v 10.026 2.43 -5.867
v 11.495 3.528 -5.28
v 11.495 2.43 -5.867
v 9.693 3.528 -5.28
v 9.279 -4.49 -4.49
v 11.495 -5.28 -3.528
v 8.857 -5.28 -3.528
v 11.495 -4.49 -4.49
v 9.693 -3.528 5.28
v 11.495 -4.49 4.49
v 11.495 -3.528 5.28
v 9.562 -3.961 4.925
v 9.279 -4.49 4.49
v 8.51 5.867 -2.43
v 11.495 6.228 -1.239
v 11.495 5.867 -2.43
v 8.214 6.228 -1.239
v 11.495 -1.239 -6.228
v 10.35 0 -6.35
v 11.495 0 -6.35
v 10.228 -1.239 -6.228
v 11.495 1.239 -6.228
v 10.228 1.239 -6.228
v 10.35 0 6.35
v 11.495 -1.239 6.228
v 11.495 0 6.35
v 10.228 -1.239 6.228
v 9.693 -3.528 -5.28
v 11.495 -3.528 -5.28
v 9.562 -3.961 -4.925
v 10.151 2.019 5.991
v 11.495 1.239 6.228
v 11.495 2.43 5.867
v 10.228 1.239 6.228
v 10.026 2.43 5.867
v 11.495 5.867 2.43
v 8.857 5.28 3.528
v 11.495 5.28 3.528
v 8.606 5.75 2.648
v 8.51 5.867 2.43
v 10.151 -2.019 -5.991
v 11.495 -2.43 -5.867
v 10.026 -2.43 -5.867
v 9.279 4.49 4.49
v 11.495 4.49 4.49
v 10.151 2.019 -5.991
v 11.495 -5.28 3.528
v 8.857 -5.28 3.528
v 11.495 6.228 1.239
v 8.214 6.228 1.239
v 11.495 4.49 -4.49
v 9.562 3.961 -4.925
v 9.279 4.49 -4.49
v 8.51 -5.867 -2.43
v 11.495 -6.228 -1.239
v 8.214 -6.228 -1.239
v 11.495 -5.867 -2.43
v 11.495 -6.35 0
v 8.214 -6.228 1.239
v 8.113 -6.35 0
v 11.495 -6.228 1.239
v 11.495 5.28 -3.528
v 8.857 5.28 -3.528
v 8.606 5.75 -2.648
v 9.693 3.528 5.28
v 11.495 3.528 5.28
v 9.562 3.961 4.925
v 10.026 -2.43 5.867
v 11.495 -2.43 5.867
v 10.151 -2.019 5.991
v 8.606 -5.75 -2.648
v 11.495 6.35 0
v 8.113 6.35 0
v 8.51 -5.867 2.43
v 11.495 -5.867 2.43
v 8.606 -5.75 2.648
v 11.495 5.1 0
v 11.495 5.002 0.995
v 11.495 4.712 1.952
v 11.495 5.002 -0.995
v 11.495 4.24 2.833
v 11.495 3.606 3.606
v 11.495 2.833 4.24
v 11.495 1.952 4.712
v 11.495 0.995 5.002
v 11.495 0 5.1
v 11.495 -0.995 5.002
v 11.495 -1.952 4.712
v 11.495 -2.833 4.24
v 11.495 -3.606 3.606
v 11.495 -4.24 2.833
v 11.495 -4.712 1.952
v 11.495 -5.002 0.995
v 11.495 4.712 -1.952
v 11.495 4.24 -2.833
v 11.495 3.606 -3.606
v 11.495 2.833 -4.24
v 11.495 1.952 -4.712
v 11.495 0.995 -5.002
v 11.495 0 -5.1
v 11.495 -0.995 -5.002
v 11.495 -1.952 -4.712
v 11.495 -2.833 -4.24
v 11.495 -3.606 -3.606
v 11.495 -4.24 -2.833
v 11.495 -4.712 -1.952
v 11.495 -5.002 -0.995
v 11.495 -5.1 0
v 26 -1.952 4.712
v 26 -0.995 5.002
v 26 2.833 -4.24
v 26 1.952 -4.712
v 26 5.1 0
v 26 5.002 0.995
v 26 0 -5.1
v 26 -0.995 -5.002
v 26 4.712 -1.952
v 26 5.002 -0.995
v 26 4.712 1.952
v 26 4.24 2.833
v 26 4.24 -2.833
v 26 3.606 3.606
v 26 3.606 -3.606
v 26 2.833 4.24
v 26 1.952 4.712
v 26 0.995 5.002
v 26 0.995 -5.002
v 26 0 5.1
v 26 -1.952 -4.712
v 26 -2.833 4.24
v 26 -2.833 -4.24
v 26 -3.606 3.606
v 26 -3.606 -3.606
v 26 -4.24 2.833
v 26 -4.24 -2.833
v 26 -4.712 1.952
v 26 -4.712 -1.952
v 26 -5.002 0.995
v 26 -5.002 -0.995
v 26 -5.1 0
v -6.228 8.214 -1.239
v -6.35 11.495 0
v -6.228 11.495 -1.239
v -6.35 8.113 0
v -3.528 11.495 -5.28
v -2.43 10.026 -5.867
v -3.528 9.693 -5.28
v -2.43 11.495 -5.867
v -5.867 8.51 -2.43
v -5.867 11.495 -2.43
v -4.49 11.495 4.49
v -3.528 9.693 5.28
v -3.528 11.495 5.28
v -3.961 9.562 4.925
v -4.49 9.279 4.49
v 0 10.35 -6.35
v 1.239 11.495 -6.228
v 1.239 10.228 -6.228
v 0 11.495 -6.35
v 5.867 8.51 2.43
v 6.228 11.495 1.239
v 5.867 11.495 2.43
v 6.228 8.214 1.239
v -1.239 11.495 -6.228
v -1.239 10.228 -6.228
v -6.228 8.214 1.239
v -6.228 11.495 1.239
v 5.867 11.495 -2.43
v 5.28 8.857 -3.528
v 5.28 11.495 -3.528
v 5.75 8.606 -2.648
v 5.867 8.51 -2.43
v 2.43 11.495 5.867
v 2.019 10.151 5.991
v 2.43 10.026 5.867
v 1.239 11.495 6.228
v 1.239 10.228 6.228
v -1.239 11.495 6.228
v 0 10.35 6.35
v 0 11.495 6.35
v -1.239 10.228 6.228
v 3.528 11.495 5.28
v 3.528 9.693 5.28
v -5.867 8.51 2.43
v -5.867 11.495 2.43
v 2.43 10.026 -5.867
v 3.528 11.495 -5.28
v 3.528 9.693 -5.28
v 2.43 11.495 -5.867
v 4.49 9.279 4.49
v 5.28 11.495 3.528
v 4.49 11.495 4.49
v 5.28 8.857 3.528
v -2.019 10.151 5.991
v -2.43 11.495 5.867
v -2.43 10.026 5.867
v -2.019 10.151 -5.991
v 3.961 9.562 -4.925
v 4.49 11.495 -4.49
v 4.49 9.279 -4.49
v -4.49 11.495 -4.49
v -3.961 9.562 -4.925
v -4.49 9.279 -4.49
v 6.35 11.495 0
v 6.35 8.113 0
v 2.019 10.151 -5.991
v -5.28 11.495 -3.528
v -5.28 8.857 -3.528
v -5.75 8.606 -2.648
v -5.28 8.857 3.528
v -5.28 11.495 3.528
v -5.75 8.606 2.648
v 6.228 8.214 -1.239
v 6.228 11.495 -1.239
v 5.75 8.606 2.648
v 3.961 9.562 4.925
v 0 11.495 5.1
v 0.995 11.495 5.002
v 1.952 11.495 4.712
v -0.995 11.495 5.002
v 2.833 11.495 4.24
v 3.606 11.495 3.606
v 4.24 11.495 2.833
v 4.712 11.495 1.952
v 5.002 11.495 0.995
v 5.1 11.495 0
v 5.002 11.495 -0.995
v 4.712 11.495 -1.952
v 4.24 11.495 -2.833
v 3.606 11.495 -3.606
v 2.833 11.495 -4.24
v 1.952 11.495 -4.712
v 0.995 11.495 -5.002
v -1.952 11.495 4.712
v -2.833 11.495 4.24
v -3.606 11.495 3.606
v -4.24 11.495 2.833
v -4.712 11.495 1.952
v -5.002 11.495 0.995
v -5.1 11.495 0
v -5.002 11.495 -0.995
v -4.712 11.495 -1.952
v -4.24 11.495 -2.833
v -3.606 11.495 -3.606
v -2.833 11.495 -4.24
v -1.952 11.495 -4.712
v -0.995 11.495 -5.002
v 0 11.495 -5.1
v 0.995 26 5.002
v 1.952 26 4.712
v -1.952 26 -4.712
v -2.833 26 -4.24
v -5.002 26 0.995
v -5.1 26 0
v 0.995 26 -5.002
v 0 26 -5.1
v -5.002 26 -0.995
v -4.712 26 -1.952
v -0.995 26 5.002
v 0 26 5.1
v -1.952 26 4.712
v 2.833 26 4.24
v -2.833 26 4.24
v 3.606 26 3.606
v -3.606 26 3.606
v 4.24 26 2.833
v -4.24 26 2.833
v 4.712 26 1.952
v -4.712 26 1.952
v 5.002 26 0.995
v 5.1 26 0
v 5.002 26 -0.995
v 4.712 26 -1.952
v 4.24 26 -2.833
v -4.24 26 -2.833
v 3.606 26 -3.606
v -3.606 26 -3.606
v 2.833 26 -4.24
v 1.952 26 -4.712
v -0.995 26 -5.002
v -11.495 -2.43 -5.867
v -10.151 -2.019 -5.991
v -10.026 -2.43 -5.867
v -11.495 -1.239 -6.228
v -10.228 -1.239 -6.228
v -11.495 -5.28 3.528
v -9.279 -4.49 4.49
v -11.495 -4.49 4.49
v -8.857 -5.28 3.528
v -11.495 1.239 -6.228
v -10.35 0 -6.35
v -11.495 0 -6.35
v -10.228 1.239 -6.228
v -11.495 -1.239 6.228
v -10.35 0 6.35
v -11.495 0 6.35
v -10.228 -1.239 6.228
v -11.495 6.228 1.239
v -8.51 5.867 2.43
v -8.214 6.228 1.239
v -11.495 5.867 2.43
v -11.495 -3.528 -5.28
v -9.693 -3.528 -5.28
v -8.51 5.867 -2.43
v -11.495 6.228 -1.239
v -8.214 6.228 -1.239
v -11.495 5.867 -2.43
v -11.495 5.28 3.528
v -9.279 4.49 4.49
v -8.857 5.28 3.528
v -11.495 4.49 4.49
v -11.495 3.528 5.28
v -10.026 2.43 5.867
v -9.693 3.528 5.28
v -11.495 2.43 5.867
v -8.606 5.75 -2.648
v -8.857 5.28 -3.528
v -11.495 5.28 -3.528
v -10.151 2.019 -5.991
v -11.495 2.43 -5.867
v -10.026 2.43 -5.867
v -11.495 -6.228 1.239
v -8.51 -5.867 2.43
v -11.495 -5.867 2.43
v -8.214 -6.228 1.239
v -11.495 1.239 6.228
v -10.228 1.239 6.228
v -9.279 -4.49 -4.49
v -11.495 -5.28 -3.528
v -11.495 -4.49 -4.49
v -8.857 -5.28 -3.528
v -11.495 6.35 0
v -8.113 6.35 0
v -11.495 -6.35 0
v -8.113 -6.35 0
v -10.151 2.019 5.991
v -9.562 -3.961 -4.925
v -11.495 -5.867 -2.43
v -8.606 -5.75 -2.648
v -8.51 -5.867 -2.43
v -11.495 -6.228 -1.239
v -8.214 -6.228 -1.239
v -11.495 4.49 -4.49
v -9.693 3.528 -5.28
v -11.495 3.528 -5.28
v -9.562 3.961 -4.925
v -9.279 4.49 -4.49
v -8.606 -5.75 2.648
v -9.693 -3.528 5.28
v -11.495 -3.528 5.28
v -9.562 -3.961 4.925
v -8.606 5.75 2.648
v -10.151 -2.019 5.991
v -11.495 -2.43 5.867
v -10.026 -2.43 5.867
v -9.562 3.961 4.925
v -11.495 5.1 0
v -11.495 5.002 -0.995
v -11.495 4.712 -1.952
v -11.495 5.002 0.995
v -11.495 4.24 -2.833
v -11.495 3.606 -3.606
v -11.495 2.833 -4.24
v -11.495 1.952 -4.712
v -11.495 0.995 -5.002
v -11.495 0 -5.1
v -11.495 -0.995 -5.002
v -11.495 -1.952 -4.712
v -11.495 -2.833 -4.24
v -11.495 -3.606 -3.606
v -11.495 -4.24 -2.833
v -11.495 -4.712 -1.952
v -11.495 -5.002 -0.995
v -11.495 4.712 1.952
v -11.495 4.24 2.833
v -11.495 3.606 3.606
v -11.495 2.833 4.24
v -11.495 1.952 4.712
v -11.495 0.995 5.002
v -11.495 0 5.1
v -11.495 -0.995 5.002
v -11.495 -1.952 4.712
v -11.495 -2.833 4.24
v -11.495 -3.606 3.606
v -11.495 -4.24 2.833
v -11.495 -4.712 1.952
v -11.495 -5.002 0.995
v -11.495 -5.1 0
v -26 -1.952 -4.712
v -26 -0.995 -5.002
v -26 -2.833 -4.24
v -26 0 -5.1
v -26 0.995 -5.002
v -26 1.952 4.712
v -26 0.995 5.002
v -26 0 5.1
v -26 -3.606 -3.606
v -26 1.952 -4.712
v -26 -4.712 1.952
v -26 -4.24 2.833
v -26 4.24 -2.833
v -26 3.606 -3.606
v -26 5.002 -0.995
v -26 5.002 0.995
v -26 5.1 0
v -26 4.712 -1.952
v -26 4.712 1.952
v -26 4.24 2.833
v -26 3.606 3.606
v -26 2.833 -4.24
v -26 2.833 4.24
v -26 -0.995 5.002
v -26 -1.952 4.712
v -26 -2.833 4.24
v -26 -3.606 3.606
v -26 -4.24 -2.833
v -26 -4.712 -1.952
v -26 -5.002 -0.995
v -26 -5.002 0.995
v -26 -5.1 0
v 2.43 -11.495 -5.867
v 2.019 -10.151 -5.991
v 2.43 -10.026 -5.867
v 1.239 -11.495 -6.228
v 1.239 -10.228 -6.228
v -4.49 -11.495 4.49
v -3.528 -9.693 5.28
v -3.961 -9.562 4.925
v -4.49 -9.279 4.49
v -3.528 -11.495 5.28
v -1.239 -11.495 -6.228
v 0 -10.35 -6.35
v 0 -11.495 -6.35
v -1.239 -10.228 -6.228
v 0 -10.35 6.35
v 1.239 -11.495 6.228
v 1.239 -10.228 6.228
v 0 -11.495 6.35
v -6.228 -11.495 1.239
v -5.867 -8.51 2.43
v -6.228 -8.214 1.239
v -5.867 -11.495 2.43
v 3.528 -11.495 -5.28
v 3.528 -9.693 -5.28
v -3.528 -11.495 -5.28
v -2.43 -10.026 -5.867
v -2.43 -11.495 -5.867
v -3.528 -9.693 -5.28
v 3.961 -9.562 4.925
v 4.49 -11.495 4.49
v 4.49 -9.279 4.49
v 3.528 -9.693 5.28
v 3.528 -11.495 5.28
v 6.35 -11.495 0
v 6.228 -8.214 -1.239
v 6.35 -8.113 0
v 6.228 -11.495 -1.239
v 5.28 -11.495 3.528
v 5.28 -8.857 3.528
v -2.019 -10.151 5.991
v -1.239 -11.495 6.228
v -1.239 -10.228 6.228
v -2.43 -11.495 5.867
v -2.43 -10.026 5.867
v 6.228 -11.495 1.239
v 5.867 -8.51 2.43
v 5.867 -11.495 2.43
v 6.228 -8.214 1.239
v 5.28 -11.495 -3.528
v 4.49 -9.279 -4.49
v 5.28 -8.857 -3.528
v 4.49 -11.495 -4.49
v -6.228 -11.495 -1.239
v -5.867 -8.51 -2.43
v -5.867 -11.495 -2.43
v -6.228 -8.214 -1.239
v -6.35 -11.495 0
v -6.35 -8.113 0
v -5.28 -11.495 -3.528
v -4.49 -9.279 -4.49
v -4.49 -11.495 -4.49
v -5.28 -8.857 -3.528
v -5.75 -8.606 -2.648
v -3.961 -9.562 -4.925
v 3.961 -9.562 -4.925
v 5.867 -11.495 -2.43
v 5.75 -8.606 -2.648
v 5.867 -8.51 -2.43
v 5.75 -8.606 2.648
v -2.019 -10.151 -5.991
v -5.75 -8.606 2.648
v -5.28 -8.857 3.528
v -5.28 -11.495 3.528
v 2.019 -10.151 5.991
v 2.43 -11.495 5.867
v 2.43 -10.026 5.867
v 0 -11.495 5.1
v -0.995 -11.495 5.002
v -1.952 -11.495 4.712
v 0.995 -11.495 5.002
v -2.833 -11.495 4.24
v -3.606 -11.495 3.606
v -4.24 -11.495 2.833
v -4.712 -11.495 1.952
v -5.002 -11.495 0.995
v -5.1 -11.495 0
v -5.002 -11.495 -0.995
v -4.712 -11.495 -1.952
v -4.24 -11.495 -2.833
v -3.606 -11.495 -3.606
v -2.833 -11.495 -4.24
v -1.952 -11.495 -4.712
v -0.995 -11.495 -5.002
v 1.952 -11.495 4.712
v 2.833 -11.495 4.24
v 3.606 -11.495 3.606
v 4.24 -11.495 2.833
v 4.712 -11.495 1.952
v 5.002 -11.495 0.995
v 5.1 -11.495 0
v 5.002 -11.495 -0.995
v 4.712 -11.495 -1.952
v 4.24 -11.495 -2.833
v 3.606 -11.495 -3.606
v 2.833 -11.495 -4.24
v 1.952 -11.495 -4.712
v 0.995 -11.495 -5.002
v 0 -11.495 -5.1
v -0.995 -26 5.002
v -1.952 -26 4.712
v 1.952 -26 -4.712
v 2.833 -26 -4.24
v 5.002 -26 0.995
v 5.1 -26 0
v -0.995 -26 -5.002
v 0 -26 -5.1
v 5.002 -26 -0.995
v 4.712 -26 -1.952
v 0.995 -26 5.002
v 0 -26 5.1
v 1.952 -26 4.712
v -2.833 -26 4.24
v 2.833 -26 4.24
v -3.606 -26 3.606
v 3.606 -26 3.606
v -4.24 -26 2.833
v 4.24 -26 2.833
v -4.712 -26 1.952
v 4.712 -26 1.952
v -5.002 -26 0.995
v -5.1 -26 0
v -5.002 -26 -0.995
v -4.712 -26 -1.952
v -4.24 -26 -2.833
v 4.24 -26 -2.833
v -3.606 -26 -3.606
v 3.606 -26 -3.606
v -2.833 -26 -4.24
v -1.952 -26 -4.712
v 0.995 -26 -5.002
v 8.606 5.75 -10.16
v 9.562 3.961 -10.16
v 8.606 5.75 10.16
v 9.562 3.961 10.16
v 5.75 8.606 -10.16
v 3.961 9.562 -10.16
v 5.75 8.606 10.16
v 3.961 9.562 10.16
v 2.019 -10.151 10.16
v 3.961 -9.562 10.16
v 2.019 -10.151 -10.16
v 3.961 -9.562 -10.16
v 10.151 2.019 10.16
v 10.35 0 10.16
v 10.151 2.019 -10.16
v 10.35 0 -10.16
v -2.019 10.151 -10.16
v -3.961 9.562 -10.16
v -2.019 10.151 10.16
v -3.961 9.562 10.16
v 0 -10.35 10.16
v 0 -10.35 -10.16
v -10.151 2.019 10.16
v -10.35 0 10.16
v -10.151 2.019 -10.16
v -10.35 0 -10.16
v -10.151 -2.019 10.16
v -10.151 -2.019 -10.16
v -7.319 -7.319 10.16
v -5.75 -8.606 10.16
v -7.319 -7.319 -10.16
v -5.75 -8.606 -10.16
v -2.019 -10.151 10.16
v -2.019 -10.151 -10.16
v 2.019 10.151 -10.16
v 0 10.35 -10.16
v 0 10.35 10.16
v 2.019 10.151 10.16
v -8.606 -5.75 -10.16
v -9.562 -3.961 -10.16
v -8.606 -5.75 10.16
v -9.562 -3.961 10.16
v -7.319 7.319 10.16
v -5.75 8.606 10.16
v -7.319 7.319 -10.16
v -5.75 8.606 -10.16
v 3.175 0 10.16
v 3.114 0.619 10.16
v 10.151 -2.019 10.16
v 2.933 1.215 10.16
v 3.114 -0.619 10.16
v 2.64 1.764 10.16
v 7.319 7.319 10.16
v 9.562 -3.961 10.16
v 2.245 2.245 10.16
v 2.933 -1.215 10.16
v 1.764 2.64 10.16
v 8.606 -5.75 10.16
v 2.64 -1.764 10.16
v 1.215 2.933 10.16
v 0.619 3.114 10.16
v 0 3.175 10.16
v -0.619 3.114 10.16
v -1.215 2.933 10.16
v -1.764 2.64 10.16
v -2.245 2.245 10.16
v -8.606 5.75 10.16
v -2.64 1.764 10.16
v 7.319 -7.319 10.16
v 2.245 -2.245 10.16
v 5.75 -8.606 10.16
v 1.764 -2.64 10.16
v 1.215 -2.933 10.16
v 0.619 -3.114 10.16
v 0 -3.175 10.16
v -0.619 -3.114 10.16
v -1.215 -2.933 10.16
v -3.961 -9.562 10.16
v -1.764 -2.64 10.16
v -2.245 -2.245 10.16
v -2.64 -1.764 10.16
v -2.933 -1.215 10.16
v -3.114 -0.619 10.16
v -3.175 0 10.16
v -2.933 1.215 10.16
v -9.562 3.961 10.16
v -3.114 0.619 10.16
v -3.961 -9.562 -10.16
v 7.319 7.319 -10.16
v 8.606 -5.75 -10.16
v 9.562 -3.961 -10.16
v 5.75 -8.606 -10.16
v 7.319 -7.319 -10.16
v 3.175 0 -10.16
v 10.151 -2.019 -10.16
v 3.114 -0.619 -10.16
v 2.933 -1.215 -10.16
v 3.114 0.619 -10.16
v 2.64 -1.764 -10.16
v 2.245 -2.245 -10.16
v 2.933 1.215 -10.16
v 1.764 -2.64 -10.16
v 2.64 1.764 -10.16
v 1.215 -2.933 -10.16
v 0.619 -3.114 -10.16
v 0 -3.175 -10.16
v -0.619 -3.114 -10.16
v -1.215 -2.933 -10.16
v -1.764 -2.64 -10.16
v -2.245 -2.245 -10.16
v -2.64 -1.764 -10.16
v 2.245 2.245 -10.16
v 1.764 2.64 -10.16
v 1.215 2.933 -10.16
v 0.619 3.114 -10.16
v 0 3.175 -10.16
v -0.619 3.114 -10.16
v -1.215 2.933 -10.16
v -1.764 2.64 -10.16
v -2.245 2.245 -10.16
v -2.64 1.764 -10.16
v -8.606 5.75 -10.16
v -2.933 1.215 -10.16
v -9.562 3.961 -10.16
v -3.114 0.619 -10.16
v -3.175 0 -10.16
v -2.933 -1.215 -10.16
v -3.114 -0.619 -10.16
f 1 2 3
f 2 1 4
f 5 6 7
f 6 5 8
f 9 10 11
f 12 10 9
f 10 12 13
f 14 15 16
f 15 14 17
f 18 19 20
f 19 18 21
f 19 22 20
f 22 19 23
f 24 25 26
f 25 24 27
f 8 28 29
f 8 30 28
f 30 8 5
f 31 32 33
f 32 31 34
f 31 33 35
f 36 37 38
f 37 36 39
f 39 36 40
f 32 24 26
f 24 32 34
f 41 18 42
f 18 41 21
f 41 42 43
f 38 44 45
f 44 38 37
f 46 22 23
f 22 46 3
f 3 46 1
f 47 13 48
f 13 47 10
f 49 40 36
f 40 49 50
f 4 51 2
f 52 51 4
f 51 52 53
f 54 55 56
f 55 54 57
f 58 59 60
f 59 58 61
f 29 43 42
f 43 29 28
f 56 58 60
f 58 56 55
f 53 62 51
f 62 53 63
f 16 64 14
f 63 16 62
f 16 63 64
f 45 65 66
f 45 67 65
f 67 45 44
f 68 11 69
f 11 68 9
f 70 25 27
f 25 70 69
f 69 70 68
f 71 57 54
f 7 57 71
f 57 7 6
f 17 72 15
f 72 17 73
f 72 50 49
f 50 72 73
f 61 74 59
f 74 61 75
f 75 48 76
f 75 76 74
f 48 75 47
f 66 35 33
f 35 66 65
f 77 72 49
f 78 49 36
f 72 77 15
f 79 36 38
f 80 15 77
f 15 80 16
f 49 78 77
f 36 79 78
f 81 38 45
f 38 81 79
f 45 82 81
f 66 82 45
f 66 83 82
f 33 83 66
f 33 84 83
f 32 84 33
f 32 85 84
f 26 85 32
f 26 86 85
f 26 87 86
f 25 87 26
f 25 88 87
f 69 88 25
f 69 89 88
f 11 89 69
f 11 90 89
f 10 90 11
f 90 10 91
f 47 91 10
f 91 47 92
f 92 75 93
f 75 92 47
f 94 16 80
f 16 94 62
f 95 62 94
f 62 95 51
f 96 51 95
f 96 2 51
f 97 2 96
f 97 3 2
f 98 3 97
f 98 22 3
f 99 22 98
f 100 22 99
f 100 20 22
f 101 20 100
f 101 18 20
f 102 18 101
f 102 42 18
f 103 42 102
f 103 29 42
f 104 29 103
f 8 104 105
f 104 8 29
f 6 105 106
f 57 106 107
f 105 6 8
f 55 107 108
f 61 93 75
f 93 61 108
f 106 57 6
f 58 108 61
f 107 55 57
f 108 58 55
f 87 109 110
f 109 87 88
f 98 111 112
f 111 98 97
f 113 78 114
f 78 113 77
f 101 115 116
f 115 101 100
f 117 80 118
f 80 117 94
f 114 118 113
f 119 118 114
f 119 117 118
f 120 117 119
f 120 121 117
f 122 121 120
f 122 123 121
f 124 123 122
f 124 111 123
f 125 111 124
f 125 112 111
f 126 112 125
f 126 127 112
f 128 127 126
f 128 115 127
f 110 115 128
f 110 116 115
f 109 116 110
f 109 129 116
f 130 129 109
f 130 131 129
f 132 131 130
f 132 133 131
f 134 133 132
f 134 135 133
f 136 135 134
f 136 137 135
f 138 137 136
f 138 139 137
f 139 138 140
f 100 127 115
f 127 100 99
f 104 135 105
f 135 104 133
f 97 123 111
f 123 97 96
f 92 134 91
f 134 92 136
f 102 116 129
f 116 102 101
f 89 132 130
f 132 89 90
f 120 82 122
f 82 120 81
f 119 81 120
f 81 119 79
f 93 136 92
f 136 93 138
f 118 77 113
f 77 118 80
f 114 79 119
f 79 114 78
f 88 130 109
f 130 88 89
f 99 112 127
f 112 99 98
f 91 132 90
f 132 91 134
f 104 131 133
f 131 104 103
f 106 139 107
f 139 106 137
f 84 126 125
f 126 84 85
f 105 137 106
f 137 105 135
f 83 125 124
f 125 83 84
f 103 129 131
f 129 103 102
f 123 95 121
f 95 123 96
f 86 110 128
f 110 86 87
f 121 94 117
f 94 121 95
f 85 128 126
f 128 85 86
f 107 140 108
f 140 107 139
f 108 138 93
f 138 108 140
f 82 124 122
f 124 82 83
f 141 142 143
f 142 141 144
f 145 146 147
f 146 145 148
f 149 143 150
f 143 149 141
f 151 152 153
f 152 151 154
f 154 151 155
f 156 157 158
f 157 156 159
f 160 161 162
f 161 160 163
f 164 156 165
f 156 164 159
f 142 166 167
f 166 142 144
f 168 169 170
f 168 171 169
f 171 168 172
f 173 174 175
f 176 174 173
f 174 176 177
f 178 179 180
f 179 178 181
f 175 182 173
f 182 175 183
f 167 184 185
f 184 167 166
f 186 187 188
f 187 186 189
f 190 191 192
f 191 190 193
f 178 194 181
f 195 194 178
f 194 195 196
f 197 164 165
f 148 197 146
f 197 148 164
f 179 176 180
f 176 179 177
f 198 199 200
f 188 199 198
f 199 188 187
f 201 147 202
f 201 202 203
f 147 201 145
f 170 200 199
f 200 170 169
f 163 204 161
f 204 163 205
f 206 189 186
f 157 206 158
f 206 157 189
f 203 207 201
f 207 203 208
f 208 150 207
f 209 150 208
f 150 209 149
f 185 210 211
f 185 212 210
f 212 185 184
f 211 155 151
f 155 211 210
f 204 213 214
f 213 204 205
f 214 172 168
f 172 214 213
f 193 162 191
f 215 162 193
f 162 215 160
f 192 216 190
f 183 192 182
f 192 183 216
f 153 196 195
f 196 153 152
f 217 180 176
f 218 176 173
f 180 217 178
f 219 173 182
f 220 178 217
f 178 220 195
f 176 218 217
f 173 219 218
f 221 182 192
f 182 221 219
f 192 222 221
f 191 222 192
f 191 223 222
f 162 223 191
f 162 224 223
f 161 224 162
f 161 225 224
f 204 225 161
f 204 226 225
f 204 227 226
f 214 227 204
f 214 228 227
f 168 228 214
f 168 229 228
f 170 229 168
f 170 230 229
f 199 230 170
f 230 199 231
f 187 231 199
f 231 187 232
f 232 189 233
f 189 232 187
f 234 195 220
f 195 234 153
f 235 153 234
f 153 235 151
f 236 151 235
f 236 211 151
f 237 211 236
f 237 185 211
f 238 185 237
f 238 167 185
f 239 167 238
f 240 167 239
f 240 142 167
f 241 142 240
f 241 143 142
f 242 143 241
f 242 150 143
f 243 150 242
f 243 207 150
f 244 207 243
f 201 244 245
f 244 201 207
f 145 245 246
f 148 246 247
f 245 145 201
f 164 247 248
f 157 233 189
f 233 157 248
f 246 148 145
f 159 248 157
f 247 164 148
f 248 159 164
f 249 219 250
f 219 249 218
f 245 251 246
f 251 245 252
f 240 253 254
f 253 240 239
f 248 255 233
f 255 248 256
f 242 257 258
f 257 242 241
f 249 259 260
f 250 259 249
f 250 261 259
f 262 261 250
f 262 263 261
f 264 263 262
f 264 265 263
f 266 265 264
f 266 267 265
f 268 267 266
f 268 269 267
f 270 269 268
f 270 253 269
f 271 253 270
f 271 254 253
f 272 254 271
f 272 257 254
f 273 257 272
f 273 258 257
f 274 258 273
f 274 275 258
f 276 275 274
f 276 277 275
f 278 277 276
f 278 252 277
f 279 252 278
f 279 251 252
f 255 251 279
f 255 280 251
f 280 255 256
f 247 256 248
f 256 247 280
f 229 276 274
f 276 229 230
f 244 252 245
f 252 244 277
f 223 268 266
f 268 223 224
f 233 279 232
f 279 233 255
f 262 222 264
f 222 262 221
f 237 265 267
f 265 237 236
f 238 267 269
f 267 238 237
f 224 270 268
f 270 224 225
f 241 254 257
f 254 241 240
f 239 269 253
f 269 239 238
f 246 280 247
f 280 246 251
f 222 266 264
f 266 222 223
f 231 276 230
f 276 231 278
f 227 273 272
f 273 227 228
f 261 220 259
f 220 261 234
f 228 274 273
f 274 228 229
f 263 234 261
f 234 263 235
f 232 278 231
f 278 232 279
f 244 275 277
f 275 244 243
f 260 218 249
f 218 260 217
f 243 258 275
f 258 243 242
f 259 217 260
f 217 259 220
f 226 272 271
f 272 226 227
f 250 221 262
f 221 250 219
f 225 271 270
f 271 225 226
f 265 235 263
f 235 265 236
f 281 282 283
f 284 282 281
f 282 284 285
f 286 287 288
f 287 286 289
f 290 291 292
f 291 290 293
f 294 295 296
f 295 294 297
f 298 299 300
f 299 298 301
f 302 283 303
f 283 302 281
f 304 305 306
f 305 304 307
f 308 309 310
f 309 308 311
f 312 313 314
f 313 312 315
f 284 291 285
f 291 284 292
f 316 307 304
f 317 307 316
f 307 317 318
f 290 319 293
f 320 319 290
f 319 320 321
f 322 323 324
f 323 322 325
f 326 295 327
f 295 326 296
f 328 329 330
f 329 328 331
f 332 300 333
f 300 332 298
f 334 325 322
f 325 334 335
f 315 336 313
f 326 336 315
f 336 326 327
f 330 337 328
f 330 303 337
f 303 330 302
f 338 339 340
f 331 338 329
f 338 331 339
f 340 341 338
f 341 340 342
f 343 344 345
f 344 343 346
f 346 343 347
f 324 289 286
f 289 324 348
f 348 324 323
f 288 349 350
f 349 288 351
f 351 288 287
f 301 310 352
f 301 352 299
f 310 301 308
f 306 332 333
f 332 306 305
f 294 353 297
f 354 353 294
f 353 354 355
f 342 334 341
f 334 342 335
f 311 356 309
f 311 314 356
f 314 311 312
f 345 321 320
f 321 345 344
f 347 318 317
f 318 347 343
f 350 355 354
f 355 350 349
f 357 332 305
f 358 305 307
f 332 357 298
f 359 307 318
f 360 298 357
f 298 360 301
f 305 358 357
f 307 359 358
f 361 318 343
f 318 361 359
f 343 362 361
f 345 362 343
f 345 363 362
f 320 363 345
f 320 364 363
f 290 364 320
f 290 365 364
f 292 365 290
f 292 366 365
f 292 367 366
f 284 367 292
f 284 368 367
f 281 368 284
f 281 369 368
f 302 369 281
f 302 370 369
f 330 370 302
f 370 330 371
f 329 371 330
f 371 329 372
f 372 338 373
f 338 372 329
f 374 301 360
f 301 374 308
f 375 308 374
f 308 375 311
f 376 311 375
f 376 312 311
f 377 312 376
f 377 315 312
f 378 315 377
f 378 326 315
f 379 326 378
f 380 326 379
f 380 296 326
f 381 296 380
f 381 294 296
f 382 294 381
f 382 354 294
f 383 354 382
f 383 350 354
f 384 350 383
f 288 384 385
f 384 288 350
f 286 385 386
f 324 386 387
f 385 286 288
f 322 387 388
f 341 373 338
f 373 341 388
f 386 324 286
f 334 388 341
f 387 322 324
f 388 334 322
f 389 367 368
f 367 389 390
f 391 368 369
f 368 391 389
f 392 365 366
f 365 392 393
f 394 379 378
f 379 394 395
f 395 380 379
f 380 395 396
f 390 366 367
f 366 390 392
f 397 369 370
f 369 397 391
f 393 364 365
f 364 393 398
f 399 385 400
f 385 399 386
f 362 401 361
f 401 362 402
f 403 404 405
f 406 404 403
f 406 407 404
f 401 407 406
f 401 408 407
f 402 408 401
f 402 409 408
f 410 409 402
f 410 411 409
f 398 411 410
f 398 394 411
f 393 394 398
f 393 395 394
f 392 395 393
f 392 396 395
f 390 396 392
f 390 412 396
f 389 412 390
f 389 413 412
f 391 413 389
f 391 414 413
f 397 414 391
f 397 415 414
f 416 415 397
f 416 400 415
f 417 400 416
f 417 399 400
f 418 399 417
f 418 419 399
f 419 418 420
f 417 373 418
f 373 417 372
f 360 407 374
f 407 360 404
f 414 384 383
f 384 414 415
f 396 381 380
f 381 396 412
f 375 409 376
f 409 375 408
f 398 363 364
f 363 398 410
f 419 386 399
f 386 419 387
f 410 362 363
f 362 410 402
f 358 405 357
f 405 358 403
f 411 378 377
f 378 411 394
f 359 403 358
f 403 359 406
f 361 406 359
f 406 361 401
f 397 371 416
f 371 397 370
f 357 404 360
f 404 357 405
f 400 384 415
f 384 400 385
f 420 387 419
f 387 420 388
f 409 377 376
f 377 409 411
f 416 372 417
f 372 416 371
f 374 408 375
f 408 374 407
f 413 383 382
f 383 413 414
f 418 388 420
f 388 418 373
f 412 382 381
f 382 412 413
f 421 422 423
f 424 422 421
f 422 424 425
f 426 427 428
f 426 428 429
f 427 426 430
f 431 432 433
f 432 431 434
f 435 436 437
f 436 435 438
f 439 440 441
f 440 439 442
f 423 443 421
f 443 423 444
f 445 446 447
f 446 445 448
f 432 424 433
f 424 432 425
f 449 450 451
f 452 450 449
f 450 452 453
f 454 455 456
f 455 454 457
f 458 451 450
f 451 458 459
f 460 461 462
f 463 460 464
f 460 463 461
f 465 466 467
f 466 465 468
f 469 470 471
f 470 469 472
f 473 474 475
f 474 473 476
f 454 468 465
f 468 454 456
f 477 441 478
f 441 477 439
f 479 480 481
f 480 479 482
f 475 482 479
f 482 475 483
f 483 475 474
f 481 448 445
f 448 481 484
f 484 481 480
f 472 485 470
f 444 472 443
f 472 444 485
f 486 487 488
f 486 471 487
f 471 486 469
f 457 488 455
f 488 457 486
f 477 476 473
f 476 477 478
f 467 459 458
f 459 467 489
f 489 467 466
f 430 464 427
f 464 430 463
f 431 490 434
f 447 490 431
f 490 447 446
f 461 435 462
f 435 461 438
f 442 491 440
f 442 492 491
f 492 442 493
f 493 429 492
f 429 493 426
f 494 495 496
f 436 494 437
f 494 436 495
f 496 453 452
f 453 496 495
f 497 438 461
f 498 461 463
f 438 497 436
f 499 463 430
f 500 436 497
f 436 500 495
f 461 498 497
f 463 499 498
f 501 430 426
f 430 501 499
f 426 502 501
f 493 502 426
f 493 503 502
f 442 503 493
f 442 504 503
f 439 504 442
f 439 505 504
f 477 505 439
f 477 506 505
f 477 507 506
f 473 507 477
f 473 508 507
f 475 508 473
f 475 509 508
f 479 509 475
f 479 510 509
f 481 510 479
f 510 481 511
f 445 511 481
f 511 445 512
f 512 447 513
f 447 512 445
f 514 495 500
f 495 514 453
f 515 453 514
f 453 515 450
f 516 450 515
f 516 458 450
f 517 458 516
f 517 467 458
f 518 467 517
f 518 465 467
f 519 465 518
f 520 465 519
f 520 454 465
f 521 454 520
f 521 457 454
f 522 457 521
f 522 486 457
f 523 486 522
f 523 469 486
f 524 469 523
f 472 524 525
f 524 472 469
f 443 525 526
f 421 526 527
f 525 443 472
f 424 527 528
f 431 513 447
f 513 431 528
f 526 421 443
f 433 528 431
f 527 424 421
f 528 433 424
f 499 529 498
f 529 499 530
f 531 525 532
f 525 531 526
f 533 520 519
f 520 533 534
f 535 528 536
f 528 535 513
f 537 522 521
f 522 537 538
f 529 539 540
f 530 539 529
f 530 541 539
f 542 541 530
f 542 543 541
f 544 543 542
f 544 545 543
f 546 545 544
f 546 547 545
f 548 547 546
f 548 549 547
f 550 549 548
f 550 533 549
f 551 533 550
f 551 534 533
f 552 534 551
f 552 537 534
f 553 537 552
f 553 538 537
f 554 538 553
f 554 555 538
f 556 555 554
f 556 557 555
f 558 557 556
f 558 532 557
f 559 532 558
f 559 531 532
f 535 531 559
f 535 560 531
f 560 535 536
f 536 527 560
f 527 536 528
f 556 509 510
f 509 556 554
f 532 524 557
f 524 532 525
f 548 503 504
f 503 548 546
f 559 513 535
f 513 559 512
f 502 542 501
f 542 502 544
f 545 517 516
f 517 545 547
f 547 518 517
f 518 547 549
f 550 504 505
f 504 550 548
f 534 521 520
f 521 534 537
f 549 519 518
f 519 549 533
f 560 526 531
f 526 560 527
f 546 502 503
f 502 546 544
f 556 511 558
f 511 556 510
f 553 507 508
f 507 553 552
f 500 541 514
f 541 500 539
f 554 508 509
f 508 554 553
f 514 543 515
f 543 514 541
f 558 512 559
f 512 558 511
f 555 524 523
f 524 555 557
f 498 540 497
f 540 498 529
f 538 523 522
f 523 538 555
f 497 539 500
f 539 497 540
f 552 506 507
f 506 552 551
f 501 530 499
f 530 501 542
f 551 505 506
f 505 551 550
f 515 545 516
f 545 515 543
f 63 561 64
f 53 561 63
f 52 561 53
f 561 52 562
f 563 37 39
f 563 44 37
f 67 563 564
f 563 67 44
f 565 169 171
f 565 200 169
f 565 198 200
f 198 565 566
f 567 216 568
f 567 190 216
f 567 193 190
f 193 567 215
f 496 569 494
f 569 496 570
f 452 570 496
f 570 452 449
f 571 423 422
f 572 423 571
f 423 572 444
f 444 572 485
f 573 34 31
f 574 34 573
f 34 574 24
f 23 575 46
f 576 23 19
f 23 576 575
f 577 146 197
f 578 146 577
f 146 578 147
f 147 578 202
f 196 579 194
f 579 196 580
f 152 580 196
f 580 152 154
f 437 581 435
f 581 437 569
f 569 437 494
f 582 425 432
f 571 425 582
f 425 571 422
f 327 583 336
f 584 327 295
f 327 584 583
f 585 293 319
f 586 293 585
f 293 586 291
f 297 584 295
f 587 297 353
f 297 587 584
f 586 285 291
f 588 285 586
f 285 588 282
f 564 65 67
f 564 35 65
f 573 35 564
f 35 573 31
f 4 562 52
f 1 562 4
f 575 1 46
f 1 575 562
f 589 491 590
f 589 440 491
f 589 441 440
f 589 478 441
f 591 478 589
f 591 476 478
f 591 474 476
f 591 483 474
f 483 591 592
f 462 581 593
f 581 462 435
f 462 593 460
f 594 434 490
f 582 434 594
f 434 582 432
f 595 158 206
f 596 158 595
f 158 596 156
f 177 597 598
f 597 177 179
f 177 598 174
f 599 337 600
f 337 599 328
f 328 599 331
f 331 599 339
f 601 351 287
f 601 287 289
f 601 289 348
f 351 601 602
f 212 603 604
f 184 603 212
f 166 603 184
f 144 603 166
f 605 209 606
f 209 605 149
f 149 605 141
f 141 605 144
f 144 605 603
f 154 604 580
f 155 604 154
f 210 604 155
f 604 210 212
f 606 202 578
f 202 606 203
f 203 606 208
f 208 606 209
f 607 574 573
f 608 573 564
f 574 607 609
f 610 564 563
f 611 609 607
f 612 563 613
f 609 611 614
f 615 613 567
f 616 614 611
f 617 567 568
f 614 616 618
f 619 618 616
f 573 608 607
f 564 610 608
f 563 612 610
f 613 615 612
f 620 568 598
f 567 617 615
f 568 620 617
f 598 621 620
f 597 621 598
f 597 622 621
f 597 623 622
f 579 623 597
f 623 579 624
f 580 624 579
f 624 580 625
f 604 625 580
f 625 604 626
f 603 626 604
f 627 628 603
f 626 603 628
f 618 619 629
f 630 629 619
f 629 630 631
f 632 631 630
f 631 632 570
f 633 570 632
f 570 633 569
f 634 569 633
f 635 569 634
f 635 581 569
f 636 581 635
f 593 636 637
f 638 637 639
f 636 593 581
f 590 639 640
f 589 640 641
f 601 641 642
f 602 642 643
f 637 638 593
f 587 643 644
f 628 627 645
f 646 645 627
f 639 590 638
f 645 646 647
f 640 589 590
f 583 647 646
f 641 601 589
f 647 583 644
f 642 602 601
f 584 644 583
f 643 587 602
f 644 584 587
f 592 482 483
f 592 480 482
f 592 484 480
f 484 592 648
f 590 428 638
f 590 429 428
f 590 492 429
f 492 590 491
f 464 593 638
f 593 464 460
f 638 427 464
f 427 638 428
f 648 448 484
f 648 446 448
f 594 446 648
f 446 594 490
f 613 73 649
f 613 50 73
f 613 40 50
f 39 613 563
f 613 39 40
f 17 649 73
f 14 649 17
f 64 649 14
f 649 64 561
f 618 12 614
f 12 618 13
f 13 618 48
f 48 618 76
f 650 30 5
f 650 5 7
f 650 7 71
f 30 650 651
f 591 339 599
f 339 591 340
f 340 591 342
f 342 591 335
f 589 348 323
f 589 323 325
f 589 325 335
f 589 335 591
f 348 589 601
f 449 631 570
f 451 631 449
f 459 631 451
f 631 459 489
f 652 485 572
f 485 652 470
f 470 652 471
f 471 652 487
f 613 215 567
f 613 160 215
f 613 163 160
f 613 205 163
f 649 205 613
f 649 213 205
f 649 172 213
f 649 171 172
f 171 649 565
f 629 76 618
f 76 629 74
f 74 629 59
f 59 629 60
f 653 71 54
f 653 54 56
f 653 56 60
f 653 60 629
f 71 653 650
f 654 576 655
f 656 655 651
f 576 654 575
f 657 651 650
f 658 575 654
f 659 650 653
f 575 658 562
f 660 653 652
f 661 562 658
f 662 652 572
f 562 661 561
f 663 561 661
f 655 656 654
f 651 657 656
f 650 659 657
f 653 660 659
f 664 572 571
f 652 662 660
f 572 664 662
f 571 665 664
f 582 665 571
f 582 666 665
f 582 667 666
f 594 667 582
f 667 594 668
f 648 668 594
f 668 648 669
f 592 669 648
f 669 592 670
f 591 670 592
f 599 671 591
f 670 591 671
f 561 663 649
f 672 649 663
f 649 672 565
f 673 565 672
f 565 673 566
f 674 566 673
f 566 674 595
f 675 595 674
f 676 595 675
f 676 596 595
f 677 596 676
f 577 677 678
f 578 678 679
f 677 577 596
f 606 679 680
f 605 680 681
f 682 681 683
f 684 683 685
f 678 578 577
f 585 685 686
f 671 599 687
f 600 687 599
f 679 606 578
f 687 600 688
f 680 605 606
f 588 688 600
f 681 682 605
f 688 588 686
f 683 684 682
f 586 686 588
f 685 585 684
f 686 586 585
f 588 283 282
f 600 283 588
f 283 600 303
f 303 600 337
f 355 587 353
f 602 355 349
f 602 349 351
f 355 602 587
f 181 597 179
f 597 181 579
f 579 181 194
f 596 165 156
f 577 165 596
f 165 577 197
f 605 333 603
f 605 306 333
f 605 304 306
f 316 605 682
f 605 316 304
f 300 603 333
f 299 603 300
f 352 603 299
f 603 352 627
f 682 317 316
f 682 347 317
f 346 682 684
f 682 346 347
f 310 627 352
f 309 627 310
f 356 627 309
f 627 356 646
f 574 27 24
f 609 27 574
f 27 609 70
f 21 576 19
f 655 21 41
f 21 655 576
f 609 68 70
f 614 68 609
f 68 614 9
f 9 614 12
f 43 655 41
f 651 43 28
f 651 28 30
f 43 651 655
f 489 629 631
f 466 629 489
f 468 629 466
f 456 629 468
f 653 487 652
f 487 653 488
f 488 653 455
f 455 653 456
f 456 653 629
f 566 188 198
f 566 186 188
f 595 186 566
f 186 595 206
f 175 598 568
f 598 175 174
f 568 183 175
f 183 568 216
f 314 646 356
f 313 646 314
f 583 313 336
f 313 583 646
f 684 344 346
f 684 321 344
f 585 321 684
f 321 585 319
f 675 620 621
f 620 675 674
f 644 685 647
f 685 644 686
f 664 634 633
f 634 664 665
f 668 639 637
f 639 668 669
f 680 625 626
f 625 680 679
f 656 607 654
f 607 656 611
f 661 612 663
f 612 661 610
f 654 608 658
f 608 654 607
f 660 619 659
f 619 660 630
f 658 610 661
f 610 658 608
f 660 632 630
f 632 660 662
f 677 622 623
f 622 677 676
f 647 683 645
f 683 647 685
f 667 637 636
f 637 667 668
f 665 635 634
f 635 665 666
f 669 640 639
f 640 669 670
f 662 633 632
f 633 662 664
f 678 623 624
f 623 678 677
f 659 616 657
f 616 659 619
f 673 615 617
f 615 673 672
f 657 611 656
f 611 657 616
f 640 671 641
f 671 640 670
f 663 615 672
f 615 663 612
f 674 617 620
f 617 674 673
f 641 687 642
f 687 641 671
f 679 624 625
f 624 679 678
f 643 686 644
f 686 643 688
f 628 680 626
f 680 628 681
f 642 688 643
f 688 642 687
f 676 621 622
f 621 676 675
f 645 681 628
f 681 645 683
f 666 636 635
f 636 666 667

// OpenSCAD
$fn = 32;

// ----------------------------------------------------------------------
// Cardan cross: 52 mm span, 12.7 mm trunnions
// ----------------------------------------------------------------------

// --- parameters (mm) ---
journal_d = 12.7;         // trunnion diameter
arm_len = 26;             // trunnion length from the centre
step_r = 4.32;            // step position from the centre
step_d = 10.2;            // journal diameter after the step
hub_d = 20.7;             // hub diameter
hub_h = 20.32;            // hub height
bore_d = 6.35;            // hub bore

difference() {
  union() {
    /* hub along the joint axis */
    cylinder(h = hub_h, d = hub_d, center = true);
    for (a = [0 : 90 : 270]) rotate([0, 0, a]) {
      /* trunnion, sunk into the hub */
      translate([hub_d / 4, 0, 0]) rotate([0, 90, 0]) cylinder(h = step_r + 2, d = journal_d);
      /* stepped journal out to the tip */
      translate([step_r - 0.5, 0, 0]) rotate([0, 90, 0]) cylinder(h = arm_len + 0.5 - step_r, d = step_d);
    }
  }
  /* lubrication bore through the hub, 2.5 mm clear on both sides */
  translate([0, 0, -hub_h / 2 - 2.5]) cylinder(h = hub_h + 5, d = bore_d);
}
